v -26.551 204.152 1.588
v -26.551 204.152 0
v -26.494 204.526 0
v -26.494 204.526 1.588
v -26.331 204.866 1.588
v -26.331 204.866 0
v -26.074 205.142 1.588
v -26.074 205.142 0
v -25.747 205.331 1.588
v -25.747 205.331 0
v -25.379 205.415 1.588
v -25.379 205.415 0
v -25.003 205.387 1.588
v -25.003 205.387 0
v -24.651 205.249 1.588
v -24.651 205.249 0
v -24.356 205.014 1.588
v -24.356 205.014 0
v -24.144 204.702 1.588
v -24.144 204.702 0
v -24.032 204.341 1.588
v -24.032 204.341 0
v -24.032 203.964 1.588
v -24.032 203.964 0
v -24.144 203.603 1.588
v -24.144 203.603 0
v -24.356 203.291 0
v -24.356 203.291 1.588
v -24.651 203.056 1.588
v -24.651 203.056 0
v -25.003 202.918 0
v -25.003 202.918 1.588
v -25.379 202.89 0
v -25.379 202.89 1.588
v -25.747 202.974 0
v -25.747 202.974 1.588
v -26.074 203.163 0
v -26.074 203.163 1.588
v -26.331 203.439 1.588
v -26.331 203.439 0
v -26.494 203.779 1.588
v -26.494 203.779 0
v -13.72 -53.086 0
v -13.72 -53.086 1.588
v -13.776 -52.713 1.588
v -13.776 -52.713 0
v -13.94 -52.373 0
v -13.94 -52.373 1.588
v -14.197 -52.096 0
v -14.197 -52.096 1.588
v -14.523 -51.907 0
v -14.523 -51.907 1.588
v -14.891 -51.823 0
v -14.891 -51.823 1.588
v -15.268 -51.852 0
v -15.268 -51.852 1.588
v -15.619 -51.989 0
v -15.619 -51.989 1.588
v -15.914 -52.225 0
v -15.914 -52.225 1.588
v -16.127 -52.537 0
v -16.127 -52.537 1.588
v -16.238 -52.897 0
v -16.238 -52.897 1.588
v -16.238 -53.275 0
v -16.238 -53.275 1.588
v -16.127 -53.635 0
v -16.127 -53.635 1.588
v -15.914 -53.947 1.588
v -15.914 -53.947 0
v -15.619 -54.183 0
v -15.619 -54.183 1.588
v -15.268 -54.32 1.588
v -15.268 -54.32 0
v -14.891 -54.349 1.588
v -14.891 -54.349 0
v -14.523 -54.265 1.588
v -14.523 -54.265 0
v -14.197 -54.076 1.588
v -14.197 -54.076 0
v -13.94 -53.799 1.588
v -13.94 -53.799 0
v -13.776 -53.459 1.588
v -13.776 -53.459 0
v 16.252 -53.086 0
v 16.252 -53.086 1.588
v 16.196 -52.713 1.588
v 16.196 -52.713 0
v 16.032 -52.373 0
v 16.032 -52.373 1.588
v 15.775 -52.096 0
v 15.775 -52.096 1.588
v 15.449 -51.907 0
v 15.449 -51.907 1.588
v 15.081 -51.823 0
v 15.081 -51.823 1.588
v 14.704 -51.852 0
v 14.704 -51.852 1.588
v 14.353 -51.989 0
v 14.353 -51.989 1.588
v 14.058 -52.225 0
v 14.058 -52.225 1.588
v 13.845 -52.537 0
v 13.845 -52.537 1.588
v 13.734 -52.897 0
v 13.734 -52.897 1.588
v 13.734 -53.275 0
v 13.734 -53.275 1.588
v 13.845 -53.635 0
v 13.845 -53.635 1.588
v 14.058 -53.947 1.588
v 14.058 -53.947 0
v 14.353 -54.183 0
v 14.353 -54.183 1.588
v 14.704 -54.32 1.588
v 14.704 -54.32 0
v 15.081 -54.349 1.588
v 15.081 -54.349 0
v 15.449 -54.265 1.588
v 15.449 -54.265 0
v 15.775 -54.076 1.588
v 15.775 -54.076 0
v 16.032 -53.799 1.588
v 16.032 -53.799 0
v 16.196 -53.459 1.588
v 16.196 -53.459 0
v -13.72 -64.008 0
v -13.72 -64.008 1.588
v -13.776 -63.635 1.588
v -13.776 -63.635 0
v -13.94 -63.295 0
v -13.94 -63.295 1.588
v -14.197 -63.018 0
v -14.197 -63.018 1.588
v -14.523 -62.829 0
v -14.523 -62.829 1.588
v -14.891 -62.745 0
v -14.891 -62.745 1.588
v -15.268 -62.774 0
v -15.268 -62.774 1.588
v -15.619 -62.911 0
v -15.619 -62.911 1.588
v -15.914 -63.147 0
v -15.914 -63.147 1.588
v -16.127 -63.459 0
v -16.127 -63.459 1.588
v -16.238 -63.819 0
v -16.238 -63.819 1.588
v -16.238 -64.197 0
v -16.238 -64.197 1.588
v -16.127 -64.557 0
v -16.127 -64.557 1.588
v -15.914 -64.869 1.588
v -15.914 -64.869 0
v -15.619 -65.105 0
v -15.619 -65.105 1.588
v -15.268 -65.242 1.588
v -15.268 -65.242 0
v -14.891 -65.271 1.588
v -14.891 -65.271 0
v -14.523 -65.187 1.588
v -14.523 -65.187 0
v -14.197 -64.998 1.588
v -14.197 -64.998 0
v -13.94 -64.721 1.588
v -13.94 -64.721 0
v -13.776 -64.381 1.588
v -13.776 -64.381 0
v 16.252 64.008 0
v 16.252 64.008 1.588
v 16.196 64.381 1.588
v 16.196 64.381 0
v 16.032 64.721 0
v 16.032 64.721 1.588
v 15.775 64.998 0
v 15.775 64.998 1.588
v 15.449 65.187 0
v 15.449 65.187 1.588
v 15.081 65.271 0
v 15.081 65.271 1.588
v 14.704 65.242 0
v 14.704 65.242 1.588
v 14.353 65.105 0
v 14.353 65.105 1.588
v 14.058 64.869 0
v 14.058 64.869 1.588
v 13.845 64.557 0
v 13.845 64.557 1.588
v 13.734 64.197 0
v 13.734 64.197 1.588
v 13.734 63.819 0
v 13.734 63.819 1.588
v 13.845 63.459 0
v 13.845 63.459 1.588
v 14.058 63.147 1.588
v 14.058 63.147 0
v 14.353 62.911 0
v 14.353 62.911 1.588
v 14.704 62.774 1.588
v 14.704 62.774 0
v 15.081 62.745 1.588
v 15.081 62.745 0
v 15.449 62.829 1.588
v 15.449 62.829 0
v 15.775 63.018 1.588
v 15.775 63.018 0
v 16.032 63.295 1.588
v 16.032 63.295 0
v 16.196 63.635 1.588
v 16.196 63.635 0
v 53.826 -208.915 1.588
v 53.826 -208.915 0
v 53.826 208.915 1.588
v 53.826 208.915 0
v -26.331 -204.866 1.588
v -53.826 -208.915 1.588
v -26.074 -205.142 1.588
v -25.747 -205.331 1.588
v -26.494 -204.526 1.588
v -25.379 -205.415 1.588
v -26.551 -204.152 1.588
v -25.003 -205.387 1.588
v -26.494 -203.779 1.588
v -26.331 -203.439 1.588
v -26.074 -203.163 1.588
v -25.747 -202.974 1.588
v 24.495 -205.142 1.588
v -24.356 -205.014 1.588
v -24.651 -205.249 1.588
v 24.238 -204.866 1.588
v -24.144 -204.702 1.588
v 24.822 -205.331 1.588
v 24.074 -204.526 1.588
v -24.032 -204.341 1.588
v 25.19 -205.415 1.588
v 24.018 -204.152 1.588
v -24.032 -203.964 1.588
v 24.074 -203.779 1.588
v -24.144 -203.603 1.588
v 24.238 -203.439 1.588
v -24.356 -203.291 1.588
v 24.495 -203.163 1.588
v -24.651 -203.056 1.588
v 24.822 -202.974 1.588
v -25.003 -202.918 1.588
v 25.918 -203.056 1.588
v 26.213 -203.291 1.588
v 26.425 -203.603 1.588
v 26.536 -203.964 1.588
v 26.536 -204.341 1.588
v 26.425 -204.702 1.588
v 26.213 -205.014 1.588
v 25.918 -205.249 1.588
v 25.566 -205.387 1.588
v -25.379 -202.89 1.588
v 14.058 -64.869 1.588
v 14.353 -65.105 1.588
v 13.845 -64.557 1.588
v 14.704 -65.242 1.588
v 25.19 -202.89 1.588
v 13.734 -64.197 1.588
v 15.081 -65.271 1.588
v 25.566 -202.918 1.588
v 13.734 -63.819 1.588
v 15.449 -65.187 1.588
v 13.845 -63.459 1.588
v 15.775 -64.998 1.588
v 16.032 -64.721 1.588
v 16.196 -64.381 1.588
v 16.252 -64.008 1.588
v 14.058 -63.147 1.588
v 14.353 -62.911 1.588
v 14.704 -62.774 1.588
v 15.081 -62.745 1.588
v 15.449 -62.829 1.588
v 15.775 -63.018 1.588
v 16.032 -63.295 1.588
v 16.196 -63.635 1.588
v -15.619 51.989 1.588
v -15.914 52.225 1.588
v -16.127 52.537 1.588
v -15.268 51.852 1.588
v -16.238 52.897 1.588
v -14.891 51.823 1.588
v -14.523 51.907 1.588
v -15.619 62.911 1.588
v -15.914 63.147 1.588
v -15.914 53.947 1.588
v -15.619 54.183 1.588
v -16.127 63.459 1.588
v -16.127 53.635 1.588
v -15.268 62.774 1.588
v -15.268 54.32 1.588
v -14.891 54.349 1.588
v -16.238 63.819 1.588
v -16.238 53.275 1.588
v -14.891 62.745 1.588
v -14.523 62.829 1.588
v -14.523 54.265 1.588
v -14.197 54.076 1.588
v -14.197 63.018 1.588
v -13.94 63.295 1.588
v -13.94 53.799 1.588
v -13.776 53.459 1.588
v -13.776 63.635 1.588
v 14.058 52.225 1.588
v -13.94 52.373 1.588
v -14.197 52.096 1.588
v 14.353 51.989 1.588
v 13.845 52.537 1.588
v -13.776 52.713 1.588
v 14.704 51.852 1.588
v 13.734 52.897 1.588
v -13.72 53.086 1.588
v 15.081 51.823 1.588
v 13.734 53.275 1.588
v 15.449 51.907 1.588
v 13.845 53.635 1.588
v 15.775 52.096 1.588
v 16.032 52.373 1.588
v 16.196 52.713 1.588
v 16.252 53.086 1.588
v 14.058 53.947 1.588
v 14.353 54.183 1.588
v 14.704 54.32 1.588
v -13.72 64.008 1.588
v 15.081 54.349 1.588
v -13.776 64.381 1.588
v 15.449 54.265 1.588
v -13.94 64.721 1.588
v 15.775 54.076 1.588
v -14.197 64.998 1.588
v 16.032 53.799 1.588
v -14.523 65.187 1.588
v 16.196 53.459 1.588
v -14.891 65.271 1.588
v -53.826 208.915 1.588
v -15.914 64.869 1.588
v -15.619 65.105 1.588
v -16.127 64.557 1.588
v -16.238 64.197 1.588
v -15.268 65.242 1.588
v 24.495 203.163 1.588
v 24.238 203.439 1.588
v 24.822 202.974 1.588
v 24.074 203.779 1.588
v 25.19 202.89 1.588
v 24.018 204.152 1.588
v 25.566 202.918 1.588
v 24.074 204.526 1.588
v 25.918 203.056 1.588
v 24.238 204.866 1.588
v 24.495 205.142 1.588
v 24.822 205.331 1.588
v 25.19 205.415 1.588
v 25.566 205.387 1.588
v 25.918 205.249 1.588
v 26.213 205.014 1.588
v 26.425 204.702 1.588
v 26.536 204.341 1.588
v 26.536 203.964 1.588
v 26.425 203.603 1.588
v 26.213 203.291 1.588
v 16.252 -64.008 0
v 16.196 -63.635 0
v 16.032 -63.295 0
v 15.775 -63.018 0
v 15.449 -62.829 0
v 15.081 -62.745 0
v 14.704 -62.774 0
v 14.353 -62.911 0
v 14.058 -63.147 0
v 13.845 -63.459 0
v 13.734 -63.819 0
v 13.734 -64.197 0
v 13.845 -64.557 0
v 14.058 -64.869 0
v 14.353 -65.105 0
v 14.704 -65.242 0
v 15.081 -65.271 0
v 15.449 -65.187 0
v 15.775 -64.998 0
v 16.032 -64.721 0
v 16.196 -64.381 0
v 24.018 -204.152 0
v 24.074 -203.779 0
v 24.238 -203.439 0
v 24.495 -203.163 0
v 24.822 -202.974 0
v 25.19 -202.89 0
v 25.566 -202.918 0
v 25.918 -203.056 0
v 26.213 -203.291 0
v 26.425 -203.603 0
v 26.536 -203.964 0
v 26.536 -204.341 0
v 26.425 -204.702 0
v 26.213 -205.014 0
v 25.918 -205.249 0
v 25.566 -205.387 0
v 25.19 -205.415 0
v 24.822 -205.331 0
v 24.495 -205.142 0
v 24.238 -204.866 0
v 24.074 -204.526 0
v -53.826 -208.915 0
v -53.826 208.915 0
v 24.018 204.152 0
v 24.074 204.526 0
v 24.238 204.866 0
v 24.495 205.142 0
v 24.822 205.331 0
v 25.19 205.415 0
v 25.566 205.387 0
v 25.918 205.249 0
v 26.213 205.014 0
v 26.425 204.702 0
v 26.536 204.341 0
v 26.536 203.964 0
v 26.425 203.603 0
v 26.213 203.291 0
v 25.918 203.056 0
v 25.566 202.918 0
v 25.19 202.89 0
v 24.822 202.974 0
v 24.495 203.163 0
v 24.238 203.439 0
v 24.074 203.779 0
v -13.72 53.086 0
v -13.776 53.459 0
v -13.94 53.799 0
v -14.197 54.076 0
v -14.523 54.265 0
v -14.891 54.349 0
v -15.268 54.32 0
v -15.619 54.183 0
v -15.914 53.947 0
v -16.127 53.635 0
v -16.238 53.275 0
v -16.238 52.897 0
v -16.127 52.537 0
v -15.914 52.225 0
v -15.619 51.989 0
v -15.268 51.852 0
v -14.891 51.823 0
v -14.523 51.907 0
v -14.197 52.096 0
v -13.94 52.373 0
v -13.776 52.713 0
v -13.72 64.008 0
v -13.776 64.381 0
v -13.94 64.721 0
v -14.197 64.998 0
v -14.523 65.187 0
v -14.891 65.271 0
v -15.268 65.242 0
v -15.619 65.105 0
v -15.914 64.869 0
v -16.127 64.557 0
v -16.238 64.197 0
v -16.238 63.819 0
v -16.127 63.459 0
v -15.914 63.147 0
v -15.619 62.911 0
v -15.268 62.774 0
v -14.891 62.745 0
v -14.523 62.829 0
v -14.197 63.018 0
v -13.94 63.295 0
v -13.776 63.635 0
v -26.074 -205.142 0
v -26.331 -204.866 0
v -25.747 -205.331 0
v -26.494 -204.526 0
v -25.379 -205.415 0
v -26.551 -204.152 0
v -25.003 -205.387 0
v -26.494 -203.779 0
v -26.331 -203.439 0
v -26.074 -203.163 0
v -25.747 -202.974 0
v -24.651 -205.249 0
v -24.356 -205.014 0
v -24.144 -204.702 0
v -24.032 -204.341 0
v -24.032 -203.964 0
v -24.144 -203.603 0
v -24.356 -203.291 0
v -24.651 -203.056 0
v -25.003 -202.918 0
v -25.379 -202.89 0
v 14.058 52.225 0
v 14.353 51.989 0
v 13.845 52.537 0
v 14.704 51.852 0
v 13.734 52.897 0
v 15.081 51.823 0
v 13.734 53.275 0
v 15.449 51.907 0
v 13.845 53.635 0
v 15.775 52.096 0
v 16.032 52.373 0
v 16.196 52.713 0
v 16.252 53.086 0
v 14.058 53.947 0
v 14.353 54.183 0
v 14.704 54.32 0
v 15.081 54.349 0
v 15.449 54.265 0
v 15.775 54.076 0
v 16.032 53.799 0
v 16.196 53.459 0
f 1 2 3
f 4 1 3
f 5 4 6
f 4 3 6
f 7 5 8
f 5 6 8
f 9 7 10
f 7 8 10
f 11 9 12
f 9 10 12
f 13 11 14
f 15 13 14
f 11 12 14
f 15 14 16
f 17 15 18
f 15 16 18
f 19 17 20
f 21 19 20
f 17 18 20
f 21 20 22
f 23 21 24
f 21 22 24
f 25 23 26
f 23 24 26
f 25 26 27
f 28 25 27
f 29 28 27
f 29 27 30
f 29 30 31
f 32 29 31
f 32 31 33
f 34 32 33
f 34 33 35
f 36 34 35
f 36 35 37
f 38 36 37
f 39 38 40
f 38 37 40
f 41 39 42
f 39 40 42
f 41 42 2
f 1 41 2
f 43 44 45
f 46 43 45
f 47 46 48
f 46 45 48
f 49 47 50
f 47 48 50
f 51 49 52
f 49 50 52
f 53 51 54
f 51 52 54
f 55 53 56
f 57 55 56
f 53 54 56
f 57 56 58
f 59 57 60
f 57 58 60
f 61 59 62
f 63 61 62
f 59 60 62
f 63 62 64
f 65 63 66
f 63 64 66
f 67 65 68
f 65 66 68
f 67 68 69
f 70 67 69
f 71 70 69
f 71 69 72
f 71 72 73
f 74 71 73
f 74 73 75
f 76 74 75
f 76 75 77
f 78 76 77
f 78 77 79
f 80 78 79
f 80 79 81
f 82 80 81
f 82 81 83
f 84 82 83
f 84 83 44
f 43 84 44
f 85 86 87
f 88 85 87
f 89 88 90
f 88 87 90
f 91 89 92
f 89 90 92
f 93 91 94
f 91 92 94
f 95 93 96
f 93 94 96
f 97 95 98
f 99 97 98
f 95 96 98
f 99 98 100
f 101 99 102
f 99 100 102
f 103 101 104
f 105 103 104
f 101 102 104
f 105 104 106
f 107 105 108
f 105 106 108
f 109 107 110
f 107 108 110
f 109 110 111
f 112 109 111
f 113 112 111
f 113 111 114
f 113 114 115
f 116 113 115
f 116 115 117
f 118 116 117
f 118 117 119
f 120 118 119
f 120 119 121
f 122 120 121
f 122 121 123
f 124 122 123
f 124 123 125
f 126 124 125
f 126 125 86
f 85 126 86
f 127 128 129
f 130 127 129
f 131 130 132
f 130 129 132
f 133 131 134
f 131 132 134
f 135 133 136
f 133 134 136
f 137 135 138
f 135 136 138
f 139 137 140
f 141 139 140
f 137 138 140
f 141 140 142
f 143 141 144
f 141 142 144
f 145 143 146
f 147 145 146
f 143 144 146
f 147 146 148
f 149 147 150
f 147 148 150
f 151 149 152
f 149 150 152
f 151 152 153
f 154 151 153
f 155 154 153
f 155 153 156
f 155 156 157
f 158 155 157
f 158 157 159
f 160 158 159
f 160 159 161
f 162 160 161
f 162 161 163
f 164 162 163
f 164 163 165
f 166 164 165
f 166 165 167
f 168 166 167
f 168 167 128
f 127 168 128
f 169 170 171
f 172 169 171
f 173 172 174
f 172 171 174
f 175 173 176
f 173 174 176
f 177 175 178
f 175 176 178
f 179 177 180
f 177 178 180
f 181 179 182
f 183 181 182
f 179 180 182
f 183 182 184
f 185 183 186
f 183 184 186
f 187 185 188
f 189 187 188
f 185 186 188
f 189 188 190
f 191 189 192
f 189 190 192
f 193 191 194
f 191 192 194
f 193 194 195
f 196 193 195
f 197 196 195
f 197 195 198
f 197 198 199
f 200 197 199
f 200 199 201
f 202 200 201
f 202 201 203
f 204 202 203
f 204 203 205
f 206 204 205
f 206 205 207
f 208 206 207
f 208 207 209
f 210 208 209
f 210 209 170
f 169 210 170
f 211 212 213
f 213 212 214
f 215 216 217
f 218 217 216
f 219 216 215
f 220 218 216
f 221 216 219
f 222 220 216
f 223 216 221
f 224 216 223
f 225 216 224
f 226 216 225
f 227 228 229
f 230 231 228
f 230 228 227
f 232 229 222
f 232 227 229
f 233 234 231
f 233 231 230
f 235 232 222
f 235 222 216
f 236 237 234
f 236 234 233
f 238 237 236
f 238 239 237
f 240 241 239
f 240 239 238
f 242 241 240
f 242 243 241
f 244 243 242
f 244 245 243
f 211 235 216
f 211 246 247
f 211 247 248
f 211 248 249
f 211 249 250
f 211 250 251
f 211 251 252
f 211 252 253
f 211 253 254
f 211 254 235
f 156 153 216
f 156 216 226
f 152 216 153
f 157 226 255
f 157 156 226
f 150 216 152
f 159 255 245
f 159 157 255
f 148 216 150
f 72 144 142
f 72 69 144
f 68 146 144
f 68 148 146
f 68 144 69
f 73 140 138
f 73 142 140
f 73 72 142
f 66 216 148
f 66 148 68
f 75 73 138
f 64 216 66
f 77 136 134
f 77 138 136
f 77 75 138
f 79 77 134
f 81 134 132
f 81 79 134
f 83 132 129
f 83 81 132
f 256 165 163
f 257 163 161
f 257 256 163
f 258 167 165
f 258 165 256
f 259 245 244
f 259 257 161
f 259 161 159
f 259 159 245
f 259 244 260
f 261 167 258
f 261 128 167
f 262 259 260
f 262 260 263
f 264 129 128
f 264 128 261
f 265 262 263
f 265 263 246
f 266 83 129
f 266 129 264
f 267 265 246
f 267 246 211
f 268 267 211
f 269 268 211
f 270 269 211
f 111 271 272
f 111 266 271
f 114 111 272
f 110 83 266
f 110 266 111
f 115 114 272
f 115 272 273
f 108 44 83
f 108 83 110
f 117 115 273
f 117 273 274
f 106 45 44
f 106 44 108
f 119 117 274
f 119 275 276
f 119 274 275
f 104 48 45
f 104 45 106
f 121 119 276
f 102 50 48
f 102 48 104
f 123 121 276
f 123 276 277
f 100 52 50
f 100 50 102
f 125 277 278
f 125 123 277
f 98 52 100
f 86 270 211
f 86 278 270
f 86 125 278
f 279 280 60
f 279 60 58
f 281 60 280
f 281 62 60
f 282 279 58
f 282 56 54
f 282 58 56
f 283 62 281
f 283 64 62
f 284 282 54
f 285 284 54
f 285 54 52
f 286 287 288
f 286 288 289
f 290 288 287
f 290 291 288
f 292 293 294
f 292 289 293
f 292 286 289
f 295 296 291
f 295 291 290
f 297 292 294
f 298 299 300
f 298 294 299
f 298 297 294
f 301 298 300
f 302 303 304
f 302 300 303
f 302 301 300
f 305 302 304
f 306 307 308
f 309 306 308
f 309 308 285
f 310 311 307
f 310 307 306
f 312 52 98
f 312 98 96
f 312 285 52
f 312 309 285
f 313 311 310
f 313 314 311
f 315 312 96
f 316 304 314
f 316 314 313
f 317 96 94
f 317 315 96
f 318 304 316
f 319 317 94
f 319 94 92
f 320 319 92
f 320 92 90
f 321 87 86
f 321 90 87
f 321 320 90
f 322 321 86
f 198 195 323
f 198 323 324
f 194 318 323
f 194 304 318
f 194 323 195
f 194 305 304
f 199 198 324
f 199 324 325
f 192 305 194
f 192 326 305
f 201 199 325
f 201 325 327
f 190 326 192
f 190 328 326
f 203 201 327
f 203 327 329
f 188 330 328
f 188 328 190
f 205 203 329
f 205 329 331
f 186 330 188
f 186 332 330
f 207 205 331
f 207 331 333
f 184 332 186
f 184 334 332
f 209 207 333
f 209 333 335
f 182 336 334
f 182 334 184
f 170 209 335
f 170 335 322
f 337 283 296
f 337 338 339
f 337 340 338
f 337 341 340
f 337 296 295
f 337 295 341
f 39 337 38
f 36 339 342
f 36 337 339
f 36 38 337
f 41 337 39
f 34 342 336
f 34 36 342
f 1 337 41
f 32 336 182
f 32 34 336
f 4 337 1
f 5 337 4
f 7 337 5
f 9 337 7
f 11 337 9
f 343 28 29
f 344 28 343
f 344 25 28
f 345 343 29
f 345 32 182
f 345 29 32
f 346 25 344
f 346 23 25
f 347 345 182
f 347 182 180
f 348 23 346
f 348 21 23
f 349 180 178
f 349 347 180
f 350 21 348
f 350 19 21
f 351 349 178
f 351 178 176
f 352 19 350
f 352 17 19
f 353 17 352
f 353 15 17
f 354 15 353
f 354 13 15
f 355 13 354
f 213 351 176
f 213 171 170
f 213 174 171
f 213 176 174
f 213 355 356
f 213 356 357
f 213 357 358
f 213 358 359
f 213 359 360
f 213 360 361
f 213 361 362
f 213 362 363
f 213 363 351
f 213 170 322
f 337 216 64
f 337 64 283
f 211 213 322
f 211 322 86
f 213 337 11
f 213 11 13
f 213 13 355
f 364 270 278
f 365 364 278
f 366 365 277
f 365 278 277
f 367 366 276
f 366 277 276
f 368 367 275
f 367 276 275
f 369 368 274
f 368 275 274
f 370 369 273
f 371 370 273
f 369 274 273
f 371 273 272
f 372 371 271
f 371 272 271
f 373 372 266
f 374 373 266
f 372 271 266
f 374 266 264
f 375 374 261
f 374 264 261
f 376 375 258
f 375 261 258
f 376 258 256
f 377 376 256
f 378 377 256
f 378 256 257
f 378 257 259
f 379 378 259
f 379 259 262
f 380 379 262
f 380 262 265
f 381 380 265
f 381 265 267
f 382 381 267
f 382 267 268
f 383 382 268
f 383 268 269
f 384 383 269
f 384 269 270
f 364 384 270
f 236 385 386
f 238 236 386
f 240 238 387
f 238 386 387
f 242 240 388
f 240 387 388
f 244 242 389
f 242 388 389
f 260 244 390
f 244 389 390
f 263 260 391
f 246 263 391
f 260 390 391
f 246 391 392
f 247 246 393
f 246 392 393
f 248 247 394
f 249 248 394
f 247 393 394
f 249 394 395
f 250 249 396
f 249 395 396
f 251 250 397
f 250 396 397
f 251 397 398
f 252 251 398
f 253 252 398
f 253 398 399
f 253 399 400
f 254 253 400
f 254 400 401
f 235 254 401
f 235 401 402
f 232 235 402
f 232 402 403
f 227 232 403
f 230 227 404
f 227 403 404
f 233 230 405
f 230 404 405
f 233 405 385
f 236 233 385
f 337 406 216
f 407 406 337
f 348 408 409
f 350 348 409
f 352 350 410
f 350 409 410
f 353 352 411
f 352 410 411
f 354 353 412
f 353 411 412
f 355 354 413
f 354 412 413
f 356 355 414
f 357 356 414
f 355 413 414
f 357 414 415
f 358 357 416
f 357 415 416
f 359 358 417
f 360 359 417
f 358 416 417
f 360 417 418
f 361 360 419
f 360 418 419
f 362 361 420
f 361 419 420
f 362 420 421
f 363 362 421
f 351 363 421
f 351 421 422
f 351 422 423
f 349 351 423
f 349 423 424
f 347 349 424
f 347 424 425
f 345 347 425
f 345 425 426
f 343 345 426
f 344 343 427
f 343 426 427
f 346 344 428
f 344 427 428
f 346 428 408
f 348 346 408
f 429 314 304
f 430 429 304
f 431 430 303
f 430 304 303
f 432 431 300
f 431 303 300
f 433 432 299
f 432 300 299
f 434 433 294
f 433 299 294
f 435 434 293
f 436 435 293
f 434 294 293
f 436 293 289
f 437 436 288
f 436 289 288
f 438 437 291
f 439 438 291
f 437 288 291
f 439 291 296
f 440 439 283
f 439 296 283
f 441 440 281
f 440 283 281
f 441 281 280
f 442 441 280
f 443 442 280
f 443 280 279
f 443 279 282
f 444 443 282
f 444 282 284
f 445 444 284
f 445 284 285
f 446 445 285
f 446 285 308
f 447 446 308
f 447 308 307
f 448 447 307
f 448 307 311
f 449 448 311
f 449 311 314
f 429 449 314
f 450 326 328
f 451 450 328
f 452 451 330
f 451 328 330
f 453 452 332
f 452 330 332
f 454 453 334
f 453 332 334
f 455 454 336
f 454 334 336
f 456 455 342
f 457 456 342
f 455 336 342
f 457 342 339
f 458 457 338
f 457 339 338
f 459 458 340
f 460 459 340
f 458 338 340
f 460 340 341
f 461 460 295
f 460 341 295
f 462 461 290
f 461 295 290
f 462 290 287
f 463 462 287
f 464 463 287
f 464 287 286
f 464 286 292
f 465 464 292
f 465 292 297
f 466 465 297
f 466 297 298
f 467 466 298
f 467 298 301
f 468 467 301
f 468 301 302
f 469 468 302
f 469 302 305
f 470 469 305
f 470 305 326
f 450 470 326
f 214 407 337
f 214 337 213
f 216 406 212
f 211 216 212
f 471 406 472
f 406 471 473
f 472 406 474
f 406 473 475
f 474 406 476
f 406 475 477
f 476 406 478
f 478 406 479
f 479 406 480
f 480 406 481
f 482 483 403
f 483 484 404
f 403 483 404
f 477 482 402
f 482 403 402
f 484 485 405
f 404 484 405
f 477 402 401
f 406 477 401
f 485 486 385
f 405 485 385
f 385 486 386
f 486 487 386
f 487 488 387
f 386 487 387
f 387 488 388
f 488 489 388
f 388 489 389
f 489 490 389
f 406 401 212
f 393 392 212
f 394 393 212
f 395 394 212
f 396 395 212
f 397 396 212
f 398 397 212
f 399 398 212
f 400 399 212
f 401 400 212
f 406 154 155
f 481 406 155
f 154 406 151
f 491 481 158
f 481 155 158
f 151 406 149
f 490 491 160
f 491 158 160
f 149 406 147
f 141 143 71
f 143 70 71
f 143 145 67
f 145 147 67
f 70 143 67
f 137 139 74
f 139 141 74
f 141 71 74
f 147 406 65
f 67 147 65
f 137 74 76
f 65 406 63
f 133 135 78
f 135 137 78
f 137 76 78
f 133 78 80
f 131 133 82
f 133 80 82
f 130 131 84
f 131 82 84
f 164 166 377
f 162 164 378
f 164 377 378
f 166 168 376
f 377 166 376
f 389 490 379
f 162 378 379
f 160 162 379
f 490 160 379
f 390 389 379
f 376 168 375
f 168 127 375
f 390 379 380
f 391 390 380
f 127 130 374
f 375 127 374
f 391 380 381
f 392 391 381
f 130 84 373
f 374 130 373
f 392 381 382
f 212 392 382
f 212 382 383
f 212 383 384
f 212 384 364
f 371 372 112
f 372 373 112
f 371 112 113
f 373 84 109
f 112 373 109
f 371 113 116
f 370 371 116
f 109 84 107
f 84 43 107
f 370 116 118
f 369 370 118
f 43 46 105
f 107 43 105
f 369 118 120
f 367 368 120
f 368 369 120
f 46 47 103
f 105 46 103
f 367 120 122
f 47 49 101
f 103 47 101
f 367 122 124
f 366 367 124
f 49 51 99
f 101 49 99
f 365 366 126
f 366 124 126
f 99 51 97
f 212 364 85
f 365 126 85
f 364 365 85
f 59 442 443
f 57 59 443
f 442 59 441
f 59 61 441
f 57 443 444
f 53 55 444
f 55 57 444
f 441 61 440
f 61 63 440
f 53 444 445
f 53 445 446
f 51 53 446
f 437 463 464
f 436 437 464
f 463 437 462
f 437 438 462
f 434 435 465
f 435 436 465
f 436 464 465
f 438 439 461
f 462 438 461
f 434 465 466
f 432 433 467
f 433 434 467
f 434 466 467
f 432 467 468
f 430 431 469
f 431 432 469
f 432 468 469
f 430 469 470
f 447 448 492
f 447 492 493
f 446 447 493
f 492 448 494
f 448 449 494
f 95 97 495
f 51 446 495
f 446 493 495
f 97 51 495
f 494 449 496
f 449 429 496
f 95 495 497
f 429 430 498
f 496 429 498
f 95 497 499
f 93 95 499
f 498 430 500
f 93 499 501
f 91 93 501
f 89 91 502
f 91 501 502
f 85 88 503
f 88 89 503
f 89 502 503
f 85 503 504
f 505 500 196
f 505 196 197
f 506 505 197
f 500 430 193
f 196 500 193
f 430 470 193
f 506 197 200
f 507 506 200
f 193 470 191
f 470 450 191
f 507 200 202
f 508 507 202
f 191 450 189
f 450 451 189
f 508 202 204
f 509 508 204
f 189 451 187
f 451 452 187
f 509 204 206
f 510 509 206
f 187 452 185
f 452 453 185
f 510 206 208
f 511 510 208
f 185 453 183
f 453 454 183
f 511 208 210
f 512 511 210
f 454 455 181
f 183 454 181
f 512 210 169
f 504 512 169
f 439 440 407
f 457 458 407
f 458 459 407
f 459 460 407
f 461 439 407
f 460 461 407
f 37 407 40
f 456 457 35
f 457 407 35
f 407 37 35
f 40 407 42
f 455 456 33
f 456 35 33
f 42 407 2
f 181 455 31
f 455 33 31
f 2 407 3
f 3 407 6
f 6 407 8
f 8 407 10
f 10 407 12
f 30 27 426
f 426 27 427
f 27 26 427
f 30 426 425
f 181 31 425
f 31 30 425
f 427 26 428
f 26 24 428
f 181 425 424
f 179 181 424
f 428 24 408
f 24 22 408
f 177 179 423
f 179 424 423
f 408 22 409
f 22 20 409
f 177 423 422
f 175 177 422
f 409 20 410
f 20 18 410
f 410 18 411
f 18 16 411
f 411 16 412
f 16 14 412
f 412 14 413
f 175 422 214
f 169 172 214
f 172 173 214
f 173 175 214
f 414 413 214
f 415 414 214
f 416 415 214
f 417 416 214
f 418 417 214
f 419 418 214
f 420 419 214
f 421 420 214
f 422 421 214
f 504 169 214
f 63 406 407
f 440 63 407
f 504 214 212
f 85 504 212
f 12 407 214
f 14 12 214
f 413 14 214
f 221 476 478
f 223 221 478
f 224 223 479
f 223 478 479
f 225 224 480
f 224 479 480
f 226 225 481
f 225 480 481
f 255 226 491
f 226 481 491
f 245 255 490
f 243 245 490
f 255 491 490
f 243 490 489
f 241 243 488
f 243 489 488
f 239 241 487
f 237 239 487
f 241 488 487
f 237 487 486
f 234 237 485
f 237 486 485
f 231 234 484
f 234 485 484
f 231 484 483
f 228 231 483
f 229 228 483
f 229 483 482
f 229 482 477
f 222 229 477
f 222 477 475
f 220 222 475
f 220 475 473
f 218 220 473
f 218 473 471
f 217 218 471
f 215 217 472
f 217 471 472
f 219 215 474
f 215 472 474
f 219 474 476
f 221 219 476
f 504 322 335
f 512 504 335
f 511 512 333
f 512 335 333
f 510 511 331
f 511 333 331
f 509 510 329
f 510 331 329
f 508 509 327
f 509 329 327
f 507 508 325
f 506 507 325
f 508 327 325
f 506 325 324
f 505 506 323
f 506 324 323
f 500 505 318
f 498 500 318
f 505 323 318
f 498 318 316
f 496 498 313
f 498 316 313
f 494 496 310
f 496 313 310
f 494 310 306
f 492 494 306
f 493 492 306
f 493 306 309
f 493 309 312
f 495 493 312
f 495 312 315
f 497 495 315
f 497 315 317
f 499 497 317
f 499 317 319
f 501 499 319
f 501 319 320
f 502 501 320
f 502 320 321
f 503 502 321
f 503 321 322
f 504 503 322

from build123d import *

# Parameters (mm, degrees)
SKETCH1_W           = 107.65282
SKETCH1_H           = 417.83
BOSS_EXTRUDE1_DEPTH = 1.5875
SKETCH2_R           = 1.26619
CUT_EXTRUDE1_DEPTH  = 1.5875
SKETCH4_R           = 1.26619
CUT_EXTRUDE2_DEPTH  = 2.5875


with BuildPart() as part:
    # Sketch1 → Boss-Extrude1 (new body)
    with BuildSketch(Plane.XY):
        Rectangle(SKETCH1_W, SKETCH1_H)
    extrude(amount=BOSS_EXTRUDE1_DEPTH)

    # Sketch2 → Cut-Extrude1 (cut)
    with BuildSketch(Plane(origin=(0, 0, 0), x_dir=(-1, 0, 0), z_dir=(0, 0, -1))):
        with Locations((25.284421279, -204.1525)):
            Circle(SKETCH2_R)
        with Locations((-25.284421279, -204.1525)):
            Circle(SKETCH2_R)
        with Locations((25.284421279, 204.1525)):
            Circle(SKETCH2_R)
        with Locations((-25.284421279, 204.1525)):
            Circle(SKETCH2_R)
    extrude(amount=-CUT_EXTRUDE1_DEPTH, mode=Mode.SUBTRACT)

    # Sketch4 → Cut-Extrude2 (cut, through all)
    with BuildSketch(Plane.XY.offset(1.5875)):
        with Locations((14.986, 53.086)):
            Circle(SKETCH4_R)
        with Locations((-14.986, 53.086)):
            Circle(SKETCH4_R)
        with Locations((14.986, -53.086)):
            Circle(SKETCH4_R)
        with Locations((-14.986, -53.086)):
            Circle(SKETCH4_R)
        with Locations((14.986, 64.008)):
            Circle(SKETCH4_R)
        with Locations((-14.986, 64.008)):
            Circle(SKETCH4_R)
        with Locations((14.986, -64.008)):
            Circle(SKETCH4_R)
        with Locations((-14.986, -64.008)):
            Circle(SKETCH4_R)
    extrude(amount=-CUT_EXTRUDE2_DEPTH, mode=Mode.SUBTRACT)


solid = part.part
